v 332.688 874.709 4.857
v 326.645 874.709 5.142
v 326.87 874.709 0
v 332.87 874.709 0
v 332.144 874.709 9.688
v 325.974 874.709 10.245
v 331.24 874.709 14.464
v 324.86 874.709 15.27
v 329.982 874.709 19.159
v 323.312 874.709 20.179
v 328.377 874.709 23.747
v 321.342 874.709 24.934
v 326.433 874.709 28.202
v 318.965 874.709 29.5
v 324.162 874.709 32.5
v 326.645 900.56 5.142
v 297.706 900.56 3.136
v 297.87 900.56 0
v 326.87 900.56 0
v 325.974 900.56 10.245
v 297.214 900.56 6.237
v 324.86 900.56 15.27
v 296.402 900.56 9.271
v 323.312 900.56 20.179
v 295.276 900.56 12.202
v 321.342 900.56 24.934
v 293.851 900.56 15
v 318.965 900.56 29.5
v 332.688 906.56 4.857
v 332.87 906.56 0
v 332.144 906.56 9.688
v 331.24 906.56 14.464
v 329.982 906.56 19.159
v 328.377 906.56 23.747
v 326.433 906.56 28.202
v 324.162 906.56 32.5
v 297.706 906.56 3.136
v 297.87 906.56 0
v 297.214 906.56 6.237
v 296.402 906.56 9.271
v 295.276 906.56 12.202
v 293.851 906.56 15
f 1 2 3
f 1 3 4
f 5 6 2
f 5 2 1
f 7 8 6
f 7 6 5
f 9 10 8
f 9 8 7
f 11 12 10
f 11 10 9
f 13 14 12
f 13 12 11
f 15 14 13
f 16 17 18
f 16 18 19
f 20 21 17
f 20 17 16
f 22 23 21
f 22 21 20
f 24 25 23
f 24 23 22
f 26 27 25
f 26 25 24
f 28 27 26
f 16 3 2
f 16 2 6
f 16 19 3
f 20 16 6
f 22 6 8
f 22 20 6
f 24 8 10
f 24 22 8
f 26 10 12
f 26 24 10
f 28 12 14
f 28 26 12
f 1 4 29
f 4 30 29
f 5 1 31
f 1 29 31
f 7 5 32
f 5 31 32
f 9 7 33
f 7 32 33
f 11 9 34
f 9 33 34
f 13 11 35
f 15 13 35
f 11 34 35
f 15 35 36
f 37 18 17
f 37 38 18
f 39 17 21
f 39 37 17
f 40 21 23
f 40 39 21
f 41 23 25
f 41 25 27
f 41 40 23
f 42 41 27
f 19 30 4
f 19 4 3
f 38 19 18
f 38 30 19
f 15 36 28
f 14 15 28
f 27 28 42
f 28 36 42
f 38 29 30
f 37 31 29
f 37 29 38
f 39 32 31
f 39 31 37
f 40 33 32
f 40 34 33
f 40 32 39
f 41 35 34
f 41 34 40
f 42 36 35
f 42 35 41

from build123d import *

# Parameters (mm, degrees)
REVOLVE1_ANGLE = 30


with BuildPart() as part:
    # Sketch1 → Revolve1 (revolve)
    with BuildSketch(Plane.XY):
        Polygon((297.869910117, 906.559895472), (332.869910117, 906.559895472), (332.869910117, 902.559895472), (332.869910117, 874.70937118), (326.869910117, 874.70937118), (326.869910117, 900.559895472), (297.869910117, 900.559895472), align=None)
    revolve(axis=Axis((267.869910117, 911.559895472, 0), (0, -1, 0)), revolution_arc=REVOLVE1_ANGLE)


solid = part.part
